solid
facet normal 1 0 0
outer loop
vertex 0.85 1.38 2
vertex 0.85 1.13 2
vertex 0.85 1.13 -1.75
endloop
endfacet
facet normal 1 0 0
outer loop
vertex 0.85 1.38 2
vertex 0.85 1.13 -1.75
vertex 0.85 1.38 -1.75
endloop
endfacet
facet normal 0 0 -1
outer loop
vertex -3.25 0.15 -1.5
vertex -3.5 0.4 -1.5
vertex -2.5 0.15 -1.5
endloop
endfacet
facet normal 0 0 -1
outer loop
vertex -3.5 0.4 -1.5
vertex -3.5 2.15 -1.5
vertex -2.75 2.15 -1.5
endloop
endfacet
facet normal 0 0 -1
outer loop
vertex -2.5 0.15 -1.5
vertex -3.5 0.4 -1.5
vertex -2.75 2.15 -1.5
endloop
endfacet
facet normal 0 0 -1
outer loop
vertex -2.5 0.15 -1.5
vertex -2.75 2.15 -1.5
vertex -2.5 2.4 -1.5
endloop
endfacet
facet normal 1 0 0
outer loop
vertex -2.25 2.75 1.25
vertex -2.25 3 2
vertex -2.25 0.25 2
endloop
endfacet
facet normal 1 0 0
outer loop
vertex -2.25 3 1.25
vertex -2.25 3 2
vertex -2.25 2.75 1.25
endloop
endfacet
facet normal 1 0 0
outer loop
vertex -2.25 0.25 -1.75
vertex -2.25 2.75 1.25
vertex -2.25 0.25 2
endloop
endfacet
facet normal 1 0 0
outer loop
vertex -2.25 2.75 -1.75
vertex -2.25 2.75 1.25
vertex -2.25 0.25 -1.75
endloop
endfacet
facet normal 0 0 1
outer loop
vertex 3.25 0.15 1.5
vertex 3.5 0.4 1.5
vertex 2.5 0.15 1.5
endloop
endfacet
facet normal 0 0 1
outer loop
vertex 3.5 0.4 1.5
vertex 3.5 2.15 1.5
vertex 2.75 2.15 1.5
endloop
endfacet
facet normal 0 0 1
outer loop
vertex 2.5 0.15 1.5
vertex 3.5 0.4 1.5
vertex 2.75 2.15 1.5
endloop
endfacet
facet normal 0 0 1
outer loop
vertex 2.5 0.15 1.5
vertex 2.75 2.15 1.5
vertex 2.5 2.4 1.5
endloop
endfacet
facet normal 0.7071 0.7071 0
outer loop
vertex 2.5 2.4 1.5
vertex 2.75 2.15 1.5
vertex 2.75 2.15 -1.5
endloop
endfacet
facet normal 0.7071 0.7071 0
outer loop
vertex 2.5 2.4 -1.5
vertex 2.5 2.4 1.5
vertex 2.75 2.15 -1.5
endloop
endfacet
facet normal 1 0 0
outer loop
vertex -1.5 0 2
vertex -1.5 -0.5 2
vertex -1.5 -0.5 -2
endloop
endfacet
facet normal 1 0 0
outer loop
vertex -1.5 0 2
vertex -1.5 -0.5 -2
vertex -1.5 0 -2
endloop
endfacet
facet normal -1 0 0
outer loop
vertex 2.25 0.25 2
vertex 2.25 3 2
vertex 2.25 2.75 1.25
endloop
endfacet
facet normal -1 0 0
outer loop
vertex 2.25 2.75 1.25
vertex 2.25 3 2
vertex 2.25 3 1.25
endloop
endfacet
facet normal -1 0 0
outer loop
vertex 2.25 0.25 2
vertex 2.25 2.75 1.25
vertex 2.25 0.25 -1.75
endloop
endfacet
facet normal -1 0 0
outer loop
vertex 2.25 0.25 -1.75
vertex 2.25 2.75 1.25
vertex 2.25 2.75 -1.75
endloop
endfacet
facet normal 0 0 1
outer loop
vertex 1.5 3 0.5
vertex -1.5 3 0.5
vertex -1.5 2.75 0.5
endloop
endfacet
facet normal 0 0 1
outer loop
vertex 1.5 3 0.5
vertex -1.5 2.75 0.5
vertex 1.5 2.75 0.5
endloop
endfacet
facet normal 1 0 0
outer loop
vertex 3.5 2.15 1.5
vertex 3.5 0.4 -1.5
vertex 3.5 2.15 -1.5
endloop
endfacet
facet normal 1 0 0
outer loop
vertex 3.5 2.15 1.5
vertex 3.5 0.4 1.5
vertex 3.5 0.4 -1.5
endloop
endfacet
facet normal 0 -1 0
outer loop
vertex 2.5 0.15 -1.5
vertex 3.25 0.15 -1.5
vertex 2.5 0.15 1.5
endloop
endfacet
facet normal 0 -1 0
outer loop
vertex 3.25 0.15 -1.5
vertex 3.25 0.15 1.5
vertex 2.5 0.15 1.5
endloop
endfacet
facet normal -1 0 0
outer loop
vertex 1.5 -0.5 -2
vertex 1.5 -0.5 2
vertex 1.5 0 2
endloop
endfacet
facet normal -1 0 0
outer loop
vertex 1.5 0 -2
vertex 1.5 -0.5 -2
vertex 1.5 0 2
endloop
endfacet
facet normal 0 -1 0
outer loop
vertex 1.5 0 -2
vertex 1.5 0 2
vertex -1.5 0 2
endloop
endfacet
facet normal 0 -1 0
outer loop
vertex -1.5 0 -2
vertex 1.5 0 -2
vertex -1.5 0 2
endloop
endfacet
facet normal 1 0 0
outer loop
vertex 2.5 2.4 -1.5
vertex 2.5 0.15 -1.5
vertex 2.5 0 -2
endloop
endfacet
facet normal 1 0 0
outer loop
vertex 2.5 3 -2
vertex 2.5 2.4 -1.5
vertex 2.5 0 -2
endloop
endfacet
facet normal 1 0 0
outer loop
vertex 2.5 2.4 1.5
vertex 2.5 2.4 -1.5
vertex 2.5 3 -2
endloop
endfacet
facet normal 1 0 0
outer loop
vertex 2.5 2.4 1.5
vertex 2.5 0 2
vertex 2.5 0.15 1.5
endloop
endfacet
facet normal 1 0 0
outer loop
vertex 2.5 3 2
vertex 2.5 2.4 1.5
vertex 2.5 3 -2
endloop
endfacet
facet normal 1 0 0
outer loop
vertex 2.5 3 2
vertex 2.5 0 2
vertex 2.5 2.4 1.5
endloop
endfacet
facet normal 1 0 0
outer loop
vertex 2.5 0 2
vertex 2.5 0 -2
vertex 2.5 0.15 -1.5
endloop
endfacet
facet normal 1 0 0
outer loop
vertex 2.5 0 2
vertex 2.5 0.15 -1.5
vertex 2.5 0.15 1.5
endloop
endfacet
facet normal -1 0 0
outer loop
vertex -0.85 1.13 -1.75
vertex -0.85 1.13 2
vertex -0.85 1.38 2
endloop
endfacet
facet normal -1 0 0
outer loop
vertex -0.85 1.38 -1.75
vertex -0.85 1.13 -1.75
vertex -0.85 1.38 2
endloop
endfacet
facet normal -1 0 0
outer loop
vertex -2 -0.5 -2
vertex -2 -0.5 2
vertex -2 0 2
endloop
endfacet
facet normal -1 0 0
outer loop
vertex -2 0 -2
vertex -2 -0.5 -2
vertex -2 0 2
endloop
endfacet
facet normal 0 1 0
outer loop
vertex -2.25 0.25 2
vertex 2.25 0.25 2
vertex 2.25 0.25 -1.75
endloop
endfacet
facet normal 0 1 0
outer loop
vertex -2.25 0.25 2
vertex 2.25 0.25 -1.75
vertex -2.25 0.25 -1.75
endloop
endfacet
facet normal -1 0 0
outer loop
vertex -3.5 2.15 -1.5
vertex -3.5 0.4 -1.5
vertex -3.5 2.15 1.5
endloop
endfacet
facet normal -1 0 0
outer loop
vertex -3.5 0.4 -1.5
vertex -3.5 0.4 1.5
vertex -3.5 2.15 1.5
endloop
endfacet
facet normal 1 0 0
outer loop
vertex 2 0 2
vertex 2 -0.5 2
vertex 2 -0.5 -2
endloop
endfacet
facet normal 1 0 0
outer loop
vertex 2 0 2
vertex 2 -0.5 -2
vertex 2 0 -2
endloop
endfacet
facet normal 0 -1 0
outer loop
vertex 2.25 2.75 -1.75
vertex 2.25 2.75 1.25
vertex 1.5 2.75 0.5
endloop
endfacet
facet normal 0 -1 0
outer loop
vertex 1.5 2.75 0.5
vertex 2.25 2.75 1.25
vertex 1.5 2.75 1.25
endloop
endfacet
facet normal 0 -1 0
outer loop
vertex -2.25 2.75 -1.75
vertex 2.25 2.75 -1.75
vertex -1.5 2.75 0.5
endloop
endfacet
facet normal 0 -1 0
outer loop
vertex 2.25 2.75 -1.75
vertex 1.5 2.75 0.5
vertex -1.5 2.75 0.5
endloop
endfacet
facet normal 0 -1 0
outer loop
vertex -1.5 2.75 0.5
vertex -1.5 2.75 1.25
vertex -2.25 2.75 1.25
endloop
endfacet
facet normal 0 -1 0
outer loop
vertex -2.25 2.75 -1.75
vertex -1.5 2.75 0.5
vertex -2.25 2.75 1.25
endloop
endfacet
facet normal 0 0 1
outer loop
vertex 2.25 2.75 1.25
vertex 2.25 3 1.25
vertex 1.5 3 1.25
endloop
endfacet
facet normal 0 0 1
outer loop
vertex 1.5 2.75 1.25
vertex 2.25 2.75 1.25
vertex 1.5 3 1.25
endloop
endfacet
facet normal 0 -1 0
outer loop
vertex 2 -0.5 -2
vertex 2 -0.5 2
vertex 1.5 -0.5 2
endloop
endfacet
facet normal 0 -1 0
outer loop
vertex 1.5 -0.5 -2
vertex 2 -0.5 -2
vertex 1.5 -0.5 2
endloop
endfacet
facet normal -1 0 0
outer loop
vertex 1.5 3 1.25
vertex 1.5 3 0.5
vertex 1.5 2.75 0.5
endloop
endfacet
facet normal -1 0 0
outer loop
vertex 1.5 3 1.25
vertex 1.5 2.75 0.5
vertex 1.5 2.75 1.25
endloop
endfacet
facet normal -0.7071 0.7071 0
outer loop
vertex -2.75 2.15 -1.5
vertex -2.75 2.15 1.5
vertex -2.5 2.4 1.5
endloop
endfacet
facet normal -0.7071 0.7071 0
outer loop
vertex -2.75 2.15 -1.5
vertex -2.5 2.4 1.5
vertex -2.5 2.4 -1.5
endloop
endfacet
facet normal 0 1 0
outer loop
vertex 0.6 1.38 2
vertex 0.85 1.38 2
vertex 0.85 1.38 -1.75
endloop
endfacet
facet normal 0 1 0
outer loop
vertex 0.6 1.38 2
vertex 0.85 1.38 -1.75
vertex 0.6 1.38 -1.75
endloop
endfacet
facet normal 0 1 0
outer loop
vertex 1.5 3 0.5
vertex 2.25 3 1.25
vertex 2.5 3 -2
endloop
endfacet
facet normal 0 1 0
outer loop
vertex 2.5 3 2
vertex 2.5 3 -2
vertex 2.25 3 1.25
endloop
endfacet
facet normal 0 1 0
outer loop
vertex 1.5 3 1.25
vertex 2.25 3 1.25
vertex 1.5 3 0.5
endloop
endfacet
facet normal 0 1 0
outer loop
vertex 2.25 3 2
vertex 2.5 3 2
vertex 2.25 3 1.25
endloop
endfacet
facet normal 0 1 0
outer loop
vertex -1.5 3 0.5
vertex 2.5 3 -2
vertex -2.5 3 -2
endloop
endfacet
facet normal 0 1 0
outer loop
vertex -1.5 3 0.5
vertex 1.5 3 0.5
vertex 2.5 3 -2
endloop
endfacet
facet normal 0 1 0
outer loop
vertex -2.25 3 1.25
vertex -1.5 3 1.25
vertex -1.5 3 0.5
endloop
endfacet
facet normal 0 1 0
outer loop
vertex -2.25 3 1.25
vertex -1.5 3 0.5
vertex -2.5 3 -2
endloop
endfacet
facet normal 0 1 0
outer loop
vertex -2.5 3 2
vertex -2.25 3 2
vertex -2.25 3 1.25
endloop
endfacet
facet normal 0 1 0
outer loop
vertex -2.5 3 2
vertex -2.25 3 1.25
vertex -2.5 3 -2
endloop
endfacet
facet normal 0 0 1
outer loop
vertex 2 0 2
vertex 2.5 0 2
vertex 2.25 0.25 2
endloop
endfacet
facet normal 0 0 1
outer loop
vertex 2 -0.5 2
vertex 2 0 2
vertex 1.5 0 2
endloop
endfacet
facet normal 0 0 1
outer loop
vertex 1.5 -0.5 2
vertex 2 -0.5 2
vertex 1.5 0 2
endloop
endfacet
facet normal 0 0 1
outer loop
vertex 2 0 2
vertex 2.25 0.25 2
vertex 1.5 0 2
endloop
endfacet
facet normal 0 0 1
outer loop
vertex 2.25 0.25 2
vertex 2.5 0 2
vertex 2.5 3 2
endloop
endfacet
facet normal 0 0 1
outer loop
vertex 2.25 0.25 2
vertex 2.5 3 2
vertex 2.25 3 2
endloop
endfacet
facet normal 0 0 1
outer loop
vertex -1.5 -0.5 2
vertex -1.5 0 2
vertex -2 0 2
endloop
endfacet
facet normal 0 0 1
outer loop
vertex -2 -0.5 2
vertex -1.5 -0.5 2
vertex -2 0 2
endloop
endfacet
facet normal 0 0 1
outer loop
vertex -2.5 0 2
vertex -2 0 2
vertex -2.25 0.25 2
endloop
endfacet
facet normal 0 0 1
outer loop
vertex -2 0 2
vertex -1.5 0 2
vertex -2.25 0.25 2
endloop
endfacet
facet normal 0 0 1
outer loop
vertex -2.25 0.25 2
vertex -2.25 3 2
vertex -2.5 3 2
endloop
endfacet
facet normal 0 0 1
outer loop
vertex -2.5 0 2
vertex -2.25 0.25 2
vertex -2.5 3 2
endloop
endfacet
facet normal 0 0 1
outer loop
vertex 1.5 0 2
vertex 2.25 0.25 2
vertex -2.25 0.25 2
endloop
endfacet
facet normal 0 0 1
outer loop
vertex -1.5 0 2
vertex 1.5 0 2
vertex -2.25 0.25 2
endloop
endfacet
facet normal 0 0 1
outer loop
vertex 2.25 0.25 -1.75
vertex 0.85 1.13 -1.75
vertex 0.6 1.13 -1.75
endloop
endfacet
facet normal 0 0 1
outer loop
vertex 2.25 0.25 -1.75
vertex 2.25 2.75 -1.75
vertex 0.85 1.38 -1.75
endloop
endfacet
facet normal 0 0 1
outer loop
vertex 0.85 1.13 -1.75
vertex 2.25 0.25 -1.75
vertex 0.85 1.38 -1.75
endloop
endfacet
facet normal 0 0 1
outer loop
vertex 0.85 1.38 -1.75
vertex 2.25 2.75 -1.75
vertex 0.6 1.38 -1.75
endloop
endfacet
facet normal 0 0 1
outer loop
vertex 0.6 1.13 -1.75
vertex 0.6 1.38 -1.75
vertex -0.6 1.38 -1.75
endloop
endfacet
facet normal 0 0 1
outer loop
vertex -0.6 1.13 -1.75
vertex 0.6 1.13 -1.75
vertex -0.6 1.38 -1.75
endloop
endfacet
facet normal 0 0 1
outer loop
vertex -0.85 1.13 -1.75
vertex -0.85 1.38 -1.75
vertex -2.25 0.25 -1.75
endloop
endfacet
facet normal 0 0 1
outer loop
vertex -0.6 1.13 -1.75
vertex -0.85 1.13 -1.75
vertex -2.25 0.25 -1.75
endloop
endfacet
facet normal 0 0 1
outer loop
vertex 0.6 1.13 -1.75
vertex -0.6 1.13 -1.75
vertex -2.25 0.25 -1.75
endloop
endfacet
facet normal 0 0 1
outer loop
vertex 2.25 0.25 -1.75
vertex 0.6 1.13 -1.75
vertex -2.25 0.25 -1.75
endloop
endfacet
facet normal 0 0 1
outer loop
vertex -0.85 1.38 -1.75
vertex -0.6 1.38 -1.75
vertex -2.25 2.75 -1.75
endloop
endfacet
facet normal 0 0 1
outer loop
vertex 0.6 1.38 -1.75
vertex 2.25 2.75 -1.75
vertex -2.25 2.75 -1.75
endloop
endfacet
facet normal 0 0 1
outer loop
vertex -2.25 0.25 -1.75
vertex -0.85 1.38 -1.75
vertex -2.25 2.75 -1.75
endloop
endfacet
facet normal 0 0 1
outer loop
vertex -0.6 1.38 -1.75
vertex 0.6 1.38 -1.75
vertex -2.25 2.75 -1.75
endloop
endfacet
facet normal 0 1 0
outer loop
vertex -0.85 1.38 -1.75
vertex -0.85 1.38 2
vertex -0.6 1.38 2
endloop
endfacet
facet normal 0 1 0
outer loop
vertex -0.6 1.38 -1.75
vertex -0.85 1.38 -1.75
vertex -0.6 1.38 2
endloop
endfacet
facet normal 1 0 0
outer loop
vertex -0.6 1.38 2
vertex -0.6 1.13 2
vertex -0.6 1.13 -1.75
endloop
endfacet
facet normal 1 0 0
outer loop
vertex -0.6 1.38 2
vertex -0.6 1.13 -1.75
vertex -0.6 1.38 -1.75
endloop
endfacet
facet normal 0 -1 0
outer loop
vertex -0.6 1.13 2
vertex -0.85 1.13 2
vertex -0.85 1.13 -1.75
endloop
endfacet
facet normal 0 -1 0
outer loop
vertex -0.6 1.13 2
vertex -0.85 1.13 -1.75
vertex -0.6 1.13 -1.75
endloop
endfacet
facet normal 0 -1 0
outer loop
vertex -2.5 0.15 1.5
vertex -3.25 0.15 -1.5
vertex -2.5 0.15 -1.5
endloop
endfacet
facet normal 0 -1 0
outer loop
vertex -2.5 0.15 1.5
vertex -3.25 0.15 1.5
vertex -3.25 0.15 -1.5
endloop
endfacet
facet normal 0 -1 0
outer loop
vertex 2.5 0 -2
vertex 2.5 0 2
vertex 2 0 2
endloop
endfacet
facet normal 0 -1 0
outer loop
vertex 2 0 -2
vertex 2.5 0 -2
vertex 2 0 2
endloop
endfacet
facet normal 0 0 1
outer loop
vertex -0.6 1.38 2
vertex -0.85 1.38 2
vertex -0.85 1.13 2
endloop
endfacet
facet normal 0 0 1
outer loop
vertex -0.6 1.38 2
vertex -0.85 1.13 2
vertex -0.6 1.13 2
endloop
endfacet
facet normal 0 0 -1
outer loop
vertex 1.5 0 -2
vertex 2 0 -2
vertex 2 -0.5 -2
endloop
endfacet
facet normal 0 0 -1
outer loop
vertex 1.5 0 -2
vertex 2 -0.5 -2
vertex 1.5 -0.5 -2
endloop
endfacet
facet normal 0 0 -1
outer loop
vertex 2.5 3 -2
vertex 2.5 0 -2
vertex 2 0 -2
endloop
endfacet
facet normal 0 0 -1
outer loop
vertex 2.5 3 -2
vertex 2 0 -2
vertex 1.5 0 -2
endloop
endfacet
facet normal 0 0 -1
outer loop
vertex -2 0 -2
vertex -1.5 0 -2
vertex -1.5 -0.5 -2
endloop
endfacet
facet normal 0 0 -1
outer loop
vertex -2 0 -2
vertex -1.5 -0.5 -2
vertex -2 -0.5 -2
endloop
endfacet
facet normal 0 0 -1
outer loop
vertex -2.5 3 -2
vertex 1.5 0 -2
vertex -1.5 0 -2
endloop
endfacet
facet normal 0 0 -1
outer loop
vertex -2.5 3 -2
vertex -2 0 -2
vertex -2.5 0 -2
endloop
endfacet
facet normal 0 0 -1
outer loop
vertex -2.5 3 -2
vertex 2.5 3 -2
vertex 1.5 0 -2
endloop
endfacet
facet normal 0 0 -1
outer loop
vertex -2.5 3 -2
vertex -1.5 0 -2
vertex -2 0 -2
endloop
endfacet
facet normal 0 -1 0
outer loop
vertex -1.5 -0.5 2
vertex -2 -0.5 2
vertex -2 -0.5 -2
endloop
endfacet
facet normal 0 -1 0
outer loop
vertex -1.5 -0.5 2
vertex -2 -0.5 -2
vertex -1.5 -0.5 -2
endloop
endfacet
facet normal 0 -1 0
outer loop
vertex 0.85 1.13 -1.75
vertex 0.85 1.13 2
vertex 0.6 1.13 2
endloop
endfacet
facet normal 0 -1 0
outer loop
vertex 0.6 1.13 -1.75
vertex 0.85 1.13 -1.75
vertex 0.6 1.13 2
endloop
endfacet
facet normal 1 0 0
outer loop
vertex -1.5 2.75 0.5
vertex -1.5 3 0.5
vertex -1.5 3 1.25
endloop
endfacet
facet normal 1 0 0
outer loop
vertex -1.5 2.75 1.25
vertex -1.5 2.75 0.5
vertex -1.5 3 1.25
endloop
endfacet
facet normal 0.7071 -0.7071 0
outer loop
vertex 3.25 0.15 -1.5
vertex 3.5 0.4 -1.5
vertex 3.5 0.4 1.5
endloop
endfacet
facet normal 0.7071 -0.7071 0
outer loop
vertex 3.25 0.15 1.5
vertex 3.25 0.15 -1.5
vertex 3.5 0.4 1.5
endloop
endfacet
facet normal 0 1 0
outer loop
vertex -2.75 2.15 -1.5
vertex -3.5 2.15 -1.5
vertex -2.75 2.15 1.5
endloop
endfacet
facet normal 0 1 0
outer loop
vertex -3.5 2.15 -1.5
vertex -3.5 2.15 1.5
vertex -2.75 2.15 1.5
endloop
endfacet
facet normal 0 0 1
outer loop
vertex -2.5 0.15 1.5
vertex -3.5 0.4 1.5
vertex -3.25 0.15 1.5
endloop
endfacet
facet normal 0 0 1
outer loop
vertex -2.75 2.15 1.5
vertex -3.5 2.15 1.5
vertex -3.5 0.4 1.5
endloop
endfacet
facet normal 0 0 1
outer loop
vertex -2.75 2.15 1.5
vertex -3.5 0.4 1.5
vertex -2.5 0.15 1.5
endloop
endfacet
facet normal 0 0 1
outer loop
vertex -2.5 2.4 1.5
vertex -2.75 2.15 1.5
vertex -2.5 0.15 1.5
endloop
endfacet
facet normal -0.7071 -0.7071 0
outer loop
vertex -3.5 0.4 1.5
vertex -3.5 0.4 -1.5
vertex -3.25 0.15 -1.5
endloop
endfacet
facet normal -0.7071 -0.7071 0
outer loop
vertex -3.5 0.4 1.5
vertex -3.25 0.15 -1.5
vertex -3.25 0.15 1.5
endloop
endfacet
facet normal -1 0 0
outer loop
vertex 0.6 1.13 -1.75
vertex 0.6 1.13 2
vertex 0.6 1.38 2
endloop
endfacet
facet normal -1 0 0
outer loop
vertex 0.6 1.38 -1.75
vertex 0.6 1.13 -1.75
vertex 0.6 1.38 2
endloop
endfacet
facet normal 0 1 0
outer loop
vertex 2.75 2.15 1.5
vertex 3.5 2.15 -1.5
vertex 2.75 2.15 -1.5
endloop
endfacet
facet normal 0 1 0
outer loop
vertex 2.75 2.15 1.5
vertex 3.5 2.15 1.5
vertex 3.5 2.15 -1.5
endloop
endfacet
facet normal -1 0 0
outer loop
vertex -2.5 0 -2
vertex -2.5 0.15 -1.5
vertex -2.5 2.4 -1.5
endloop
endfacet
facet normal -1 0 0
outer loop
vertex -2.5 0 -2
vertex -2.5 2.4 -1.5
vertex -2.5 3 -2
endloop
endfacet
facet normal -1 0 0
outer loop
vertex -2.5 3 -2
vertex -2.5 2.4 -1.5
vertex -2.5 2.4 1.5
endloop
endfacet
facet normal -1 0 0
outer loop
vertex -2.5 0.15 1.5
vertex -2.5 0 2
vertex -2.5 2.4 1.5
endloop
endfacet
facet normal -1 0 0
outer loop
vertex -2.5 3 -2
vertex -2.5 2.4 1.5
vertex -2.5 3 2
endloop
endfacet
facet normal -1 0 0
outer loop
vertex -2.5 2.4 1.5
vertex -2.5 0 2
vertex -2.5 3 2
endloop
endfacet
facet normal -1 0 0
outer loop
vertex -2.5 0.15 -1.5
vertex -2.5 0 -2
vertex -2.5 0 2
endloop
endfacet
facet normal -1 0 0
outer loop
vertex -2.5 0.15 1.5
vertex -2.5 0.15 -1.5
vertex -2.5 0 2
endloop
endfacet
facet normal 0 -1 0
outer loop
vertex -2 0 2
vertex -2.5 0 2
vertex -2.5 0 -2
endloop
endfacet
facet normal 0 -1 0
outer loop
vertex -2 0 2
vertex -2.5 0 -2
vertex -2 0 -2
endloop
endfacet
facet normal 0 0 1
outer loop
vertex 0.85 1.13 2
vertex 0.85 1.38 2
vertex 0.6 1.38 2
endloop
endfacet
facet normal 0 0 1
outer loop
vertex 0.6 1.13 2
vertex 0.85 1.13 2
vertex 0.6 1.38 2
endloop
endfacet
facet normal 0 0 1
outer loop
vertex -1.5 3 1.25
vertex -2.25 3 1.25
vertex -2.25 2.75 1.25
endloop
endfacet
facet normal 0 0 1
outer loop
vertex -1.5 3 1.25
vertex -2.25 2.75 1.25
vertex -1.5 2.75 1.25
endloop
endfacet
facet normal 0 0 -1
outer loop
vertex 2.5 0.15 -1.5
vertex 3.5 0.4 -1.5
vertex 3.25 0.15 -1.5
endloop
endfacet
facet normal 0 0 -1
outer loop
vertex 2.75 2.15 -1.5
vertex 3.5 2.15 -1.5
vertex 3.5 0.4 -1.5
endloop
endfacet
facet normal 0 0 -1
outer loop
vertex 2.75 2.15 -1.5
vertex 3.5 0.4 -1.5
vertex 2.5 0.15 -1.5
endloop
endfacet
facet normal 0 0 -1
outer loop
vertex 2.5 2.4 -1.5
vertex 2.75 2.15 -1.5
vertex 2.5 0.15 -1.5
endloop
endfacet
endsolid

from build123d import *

# Parameters (mm, degrees)
BOSS_EXTRUDE1_DEPTH = 2
SKETCH1_3_W         = 1
SKETCH1_3_H         = 2
BOSS_EXTRUDE2_DEPTH = 1.5
CHAMFER1_SIZE       = 0.25
SKETCH2_W           = 2.25
SKETCH2_H           = 2.5
SKETCH2_W_2         = 0.25
SKETCH2_H_2         = 0.25
CUT_EXTRUDE1_DEPTH  = 3.75
CUT_EXTRUDE2_REACH  = 7.339
SKETCH3_W           = 0.75
SKETCH3_H           = 0.75


with BuildPart() as part:
    # Sketch1 → Boss-Extrude1 (new, symmetric)
    with BuildSketch(Plane.XY):
        Polygon((-1.5, 0), (0, 0), (0, 3), (-2.5, 3), (-2.5, 0), (-2, 0), (-2, -0.5), (-1.5, -0.5), align=None)
    extrude(amount=BOSS_EXTRUDE1_DEPTH, both=True)

    # Sketch1<3> → Boss-Extrude2 (add, symmetric)
    with BuildSketch(Plane.XY):
        with Locations((-3, 1.15)):
            Rectangle(SKETCH1_3_W, SKETCH1_3_H)
    extrude(amount=BOSS_EXTRUDE2_DEPTH, both=True)

    # Chamfer1
    chamfer1_edges = [part.edges().sort_by_distance(p)[0] for p in [
        (-3.5, 0.15, 0),
        (-2.5, 2.15, 0),
    ]]
    chamfer(chamfer1_edges, length=CHAMFER1_SIZE)

    # Sketch2 → Cut-Extrude1 (cut)
    with BuildSketch(Plane.XY.offset(2)):
        with Locations((-1.125, 1.5)):
            Rectangle(SKETCH2_W, SKETCH2_H)
        with Locations((-0.725, 1.255)):
            Rectangle(SKETCH2_W_2, SKETCH2_H_2, mode=Mode.SUBTRACT)
    extrude(amount=-CUT_EXTRUDE1_DEPTH, mode=Mode.SUBTRACT)

    # Sketch3 → Cut-Extrude2 (cut, up to next)
    with BuildSketch(Plane(origin=(0, 3, 0), x_dir=(1, 0, 0), z_dir=(0, 1, 0)), mode=Mode.PRIVATE) as cut_extrude2_sk1:
        Polygon((-1.5, -2), (0, -2), (0, -0.5), (-1.5, -0.5), (-1.5, -1.25), align=None)
    cut_extrude2_tool1 = extrude(cut_extrude2_sk1.sketch, amount=-CUT_EXTRUDE2_REACH, mode=Mode.PRIVATE) & part.part
    # Sketch3 → Cut-Extrude2 (cut, up to next)
    with BuildSketch(Plane(origin=(0, 3, 0), x_dir=(1, 0, 0), z_dir=(0, 1, 0)), mode=Mode.PRIVATE) as cut_extrude2_sk2:
        with Locations((-1.875, -1.625)):
            Rectangle(SKETCH3_W, SKETCH3_H)
    cut_extrude2_tool2 = extrude(cut_extrude2_sk2.sketch, amount=-CUT_EXTRUDE2_REACH, mode=Mode.PRIVATE) & part.part
    add(cut_extrude2_tool1.solids().sort_by_distance((-0.75, 3, 1.25))[0], mode=Mode.SUBTRACT)
    add(cut_extrude2_tool2.solids().sort_by_distance((-1.875, 3, 1.625))[0], mode=Mode.SUBTRACT)

    # Mirror1: part across plane


with BuildPart() as part_1:
    add(part.part)
    add(part.part.mirror(Plane(origin=(0, 0, 2), x_dir=(0, 0, 1), z_dir=(-1, 0, 0))))


solid = part_1.part
